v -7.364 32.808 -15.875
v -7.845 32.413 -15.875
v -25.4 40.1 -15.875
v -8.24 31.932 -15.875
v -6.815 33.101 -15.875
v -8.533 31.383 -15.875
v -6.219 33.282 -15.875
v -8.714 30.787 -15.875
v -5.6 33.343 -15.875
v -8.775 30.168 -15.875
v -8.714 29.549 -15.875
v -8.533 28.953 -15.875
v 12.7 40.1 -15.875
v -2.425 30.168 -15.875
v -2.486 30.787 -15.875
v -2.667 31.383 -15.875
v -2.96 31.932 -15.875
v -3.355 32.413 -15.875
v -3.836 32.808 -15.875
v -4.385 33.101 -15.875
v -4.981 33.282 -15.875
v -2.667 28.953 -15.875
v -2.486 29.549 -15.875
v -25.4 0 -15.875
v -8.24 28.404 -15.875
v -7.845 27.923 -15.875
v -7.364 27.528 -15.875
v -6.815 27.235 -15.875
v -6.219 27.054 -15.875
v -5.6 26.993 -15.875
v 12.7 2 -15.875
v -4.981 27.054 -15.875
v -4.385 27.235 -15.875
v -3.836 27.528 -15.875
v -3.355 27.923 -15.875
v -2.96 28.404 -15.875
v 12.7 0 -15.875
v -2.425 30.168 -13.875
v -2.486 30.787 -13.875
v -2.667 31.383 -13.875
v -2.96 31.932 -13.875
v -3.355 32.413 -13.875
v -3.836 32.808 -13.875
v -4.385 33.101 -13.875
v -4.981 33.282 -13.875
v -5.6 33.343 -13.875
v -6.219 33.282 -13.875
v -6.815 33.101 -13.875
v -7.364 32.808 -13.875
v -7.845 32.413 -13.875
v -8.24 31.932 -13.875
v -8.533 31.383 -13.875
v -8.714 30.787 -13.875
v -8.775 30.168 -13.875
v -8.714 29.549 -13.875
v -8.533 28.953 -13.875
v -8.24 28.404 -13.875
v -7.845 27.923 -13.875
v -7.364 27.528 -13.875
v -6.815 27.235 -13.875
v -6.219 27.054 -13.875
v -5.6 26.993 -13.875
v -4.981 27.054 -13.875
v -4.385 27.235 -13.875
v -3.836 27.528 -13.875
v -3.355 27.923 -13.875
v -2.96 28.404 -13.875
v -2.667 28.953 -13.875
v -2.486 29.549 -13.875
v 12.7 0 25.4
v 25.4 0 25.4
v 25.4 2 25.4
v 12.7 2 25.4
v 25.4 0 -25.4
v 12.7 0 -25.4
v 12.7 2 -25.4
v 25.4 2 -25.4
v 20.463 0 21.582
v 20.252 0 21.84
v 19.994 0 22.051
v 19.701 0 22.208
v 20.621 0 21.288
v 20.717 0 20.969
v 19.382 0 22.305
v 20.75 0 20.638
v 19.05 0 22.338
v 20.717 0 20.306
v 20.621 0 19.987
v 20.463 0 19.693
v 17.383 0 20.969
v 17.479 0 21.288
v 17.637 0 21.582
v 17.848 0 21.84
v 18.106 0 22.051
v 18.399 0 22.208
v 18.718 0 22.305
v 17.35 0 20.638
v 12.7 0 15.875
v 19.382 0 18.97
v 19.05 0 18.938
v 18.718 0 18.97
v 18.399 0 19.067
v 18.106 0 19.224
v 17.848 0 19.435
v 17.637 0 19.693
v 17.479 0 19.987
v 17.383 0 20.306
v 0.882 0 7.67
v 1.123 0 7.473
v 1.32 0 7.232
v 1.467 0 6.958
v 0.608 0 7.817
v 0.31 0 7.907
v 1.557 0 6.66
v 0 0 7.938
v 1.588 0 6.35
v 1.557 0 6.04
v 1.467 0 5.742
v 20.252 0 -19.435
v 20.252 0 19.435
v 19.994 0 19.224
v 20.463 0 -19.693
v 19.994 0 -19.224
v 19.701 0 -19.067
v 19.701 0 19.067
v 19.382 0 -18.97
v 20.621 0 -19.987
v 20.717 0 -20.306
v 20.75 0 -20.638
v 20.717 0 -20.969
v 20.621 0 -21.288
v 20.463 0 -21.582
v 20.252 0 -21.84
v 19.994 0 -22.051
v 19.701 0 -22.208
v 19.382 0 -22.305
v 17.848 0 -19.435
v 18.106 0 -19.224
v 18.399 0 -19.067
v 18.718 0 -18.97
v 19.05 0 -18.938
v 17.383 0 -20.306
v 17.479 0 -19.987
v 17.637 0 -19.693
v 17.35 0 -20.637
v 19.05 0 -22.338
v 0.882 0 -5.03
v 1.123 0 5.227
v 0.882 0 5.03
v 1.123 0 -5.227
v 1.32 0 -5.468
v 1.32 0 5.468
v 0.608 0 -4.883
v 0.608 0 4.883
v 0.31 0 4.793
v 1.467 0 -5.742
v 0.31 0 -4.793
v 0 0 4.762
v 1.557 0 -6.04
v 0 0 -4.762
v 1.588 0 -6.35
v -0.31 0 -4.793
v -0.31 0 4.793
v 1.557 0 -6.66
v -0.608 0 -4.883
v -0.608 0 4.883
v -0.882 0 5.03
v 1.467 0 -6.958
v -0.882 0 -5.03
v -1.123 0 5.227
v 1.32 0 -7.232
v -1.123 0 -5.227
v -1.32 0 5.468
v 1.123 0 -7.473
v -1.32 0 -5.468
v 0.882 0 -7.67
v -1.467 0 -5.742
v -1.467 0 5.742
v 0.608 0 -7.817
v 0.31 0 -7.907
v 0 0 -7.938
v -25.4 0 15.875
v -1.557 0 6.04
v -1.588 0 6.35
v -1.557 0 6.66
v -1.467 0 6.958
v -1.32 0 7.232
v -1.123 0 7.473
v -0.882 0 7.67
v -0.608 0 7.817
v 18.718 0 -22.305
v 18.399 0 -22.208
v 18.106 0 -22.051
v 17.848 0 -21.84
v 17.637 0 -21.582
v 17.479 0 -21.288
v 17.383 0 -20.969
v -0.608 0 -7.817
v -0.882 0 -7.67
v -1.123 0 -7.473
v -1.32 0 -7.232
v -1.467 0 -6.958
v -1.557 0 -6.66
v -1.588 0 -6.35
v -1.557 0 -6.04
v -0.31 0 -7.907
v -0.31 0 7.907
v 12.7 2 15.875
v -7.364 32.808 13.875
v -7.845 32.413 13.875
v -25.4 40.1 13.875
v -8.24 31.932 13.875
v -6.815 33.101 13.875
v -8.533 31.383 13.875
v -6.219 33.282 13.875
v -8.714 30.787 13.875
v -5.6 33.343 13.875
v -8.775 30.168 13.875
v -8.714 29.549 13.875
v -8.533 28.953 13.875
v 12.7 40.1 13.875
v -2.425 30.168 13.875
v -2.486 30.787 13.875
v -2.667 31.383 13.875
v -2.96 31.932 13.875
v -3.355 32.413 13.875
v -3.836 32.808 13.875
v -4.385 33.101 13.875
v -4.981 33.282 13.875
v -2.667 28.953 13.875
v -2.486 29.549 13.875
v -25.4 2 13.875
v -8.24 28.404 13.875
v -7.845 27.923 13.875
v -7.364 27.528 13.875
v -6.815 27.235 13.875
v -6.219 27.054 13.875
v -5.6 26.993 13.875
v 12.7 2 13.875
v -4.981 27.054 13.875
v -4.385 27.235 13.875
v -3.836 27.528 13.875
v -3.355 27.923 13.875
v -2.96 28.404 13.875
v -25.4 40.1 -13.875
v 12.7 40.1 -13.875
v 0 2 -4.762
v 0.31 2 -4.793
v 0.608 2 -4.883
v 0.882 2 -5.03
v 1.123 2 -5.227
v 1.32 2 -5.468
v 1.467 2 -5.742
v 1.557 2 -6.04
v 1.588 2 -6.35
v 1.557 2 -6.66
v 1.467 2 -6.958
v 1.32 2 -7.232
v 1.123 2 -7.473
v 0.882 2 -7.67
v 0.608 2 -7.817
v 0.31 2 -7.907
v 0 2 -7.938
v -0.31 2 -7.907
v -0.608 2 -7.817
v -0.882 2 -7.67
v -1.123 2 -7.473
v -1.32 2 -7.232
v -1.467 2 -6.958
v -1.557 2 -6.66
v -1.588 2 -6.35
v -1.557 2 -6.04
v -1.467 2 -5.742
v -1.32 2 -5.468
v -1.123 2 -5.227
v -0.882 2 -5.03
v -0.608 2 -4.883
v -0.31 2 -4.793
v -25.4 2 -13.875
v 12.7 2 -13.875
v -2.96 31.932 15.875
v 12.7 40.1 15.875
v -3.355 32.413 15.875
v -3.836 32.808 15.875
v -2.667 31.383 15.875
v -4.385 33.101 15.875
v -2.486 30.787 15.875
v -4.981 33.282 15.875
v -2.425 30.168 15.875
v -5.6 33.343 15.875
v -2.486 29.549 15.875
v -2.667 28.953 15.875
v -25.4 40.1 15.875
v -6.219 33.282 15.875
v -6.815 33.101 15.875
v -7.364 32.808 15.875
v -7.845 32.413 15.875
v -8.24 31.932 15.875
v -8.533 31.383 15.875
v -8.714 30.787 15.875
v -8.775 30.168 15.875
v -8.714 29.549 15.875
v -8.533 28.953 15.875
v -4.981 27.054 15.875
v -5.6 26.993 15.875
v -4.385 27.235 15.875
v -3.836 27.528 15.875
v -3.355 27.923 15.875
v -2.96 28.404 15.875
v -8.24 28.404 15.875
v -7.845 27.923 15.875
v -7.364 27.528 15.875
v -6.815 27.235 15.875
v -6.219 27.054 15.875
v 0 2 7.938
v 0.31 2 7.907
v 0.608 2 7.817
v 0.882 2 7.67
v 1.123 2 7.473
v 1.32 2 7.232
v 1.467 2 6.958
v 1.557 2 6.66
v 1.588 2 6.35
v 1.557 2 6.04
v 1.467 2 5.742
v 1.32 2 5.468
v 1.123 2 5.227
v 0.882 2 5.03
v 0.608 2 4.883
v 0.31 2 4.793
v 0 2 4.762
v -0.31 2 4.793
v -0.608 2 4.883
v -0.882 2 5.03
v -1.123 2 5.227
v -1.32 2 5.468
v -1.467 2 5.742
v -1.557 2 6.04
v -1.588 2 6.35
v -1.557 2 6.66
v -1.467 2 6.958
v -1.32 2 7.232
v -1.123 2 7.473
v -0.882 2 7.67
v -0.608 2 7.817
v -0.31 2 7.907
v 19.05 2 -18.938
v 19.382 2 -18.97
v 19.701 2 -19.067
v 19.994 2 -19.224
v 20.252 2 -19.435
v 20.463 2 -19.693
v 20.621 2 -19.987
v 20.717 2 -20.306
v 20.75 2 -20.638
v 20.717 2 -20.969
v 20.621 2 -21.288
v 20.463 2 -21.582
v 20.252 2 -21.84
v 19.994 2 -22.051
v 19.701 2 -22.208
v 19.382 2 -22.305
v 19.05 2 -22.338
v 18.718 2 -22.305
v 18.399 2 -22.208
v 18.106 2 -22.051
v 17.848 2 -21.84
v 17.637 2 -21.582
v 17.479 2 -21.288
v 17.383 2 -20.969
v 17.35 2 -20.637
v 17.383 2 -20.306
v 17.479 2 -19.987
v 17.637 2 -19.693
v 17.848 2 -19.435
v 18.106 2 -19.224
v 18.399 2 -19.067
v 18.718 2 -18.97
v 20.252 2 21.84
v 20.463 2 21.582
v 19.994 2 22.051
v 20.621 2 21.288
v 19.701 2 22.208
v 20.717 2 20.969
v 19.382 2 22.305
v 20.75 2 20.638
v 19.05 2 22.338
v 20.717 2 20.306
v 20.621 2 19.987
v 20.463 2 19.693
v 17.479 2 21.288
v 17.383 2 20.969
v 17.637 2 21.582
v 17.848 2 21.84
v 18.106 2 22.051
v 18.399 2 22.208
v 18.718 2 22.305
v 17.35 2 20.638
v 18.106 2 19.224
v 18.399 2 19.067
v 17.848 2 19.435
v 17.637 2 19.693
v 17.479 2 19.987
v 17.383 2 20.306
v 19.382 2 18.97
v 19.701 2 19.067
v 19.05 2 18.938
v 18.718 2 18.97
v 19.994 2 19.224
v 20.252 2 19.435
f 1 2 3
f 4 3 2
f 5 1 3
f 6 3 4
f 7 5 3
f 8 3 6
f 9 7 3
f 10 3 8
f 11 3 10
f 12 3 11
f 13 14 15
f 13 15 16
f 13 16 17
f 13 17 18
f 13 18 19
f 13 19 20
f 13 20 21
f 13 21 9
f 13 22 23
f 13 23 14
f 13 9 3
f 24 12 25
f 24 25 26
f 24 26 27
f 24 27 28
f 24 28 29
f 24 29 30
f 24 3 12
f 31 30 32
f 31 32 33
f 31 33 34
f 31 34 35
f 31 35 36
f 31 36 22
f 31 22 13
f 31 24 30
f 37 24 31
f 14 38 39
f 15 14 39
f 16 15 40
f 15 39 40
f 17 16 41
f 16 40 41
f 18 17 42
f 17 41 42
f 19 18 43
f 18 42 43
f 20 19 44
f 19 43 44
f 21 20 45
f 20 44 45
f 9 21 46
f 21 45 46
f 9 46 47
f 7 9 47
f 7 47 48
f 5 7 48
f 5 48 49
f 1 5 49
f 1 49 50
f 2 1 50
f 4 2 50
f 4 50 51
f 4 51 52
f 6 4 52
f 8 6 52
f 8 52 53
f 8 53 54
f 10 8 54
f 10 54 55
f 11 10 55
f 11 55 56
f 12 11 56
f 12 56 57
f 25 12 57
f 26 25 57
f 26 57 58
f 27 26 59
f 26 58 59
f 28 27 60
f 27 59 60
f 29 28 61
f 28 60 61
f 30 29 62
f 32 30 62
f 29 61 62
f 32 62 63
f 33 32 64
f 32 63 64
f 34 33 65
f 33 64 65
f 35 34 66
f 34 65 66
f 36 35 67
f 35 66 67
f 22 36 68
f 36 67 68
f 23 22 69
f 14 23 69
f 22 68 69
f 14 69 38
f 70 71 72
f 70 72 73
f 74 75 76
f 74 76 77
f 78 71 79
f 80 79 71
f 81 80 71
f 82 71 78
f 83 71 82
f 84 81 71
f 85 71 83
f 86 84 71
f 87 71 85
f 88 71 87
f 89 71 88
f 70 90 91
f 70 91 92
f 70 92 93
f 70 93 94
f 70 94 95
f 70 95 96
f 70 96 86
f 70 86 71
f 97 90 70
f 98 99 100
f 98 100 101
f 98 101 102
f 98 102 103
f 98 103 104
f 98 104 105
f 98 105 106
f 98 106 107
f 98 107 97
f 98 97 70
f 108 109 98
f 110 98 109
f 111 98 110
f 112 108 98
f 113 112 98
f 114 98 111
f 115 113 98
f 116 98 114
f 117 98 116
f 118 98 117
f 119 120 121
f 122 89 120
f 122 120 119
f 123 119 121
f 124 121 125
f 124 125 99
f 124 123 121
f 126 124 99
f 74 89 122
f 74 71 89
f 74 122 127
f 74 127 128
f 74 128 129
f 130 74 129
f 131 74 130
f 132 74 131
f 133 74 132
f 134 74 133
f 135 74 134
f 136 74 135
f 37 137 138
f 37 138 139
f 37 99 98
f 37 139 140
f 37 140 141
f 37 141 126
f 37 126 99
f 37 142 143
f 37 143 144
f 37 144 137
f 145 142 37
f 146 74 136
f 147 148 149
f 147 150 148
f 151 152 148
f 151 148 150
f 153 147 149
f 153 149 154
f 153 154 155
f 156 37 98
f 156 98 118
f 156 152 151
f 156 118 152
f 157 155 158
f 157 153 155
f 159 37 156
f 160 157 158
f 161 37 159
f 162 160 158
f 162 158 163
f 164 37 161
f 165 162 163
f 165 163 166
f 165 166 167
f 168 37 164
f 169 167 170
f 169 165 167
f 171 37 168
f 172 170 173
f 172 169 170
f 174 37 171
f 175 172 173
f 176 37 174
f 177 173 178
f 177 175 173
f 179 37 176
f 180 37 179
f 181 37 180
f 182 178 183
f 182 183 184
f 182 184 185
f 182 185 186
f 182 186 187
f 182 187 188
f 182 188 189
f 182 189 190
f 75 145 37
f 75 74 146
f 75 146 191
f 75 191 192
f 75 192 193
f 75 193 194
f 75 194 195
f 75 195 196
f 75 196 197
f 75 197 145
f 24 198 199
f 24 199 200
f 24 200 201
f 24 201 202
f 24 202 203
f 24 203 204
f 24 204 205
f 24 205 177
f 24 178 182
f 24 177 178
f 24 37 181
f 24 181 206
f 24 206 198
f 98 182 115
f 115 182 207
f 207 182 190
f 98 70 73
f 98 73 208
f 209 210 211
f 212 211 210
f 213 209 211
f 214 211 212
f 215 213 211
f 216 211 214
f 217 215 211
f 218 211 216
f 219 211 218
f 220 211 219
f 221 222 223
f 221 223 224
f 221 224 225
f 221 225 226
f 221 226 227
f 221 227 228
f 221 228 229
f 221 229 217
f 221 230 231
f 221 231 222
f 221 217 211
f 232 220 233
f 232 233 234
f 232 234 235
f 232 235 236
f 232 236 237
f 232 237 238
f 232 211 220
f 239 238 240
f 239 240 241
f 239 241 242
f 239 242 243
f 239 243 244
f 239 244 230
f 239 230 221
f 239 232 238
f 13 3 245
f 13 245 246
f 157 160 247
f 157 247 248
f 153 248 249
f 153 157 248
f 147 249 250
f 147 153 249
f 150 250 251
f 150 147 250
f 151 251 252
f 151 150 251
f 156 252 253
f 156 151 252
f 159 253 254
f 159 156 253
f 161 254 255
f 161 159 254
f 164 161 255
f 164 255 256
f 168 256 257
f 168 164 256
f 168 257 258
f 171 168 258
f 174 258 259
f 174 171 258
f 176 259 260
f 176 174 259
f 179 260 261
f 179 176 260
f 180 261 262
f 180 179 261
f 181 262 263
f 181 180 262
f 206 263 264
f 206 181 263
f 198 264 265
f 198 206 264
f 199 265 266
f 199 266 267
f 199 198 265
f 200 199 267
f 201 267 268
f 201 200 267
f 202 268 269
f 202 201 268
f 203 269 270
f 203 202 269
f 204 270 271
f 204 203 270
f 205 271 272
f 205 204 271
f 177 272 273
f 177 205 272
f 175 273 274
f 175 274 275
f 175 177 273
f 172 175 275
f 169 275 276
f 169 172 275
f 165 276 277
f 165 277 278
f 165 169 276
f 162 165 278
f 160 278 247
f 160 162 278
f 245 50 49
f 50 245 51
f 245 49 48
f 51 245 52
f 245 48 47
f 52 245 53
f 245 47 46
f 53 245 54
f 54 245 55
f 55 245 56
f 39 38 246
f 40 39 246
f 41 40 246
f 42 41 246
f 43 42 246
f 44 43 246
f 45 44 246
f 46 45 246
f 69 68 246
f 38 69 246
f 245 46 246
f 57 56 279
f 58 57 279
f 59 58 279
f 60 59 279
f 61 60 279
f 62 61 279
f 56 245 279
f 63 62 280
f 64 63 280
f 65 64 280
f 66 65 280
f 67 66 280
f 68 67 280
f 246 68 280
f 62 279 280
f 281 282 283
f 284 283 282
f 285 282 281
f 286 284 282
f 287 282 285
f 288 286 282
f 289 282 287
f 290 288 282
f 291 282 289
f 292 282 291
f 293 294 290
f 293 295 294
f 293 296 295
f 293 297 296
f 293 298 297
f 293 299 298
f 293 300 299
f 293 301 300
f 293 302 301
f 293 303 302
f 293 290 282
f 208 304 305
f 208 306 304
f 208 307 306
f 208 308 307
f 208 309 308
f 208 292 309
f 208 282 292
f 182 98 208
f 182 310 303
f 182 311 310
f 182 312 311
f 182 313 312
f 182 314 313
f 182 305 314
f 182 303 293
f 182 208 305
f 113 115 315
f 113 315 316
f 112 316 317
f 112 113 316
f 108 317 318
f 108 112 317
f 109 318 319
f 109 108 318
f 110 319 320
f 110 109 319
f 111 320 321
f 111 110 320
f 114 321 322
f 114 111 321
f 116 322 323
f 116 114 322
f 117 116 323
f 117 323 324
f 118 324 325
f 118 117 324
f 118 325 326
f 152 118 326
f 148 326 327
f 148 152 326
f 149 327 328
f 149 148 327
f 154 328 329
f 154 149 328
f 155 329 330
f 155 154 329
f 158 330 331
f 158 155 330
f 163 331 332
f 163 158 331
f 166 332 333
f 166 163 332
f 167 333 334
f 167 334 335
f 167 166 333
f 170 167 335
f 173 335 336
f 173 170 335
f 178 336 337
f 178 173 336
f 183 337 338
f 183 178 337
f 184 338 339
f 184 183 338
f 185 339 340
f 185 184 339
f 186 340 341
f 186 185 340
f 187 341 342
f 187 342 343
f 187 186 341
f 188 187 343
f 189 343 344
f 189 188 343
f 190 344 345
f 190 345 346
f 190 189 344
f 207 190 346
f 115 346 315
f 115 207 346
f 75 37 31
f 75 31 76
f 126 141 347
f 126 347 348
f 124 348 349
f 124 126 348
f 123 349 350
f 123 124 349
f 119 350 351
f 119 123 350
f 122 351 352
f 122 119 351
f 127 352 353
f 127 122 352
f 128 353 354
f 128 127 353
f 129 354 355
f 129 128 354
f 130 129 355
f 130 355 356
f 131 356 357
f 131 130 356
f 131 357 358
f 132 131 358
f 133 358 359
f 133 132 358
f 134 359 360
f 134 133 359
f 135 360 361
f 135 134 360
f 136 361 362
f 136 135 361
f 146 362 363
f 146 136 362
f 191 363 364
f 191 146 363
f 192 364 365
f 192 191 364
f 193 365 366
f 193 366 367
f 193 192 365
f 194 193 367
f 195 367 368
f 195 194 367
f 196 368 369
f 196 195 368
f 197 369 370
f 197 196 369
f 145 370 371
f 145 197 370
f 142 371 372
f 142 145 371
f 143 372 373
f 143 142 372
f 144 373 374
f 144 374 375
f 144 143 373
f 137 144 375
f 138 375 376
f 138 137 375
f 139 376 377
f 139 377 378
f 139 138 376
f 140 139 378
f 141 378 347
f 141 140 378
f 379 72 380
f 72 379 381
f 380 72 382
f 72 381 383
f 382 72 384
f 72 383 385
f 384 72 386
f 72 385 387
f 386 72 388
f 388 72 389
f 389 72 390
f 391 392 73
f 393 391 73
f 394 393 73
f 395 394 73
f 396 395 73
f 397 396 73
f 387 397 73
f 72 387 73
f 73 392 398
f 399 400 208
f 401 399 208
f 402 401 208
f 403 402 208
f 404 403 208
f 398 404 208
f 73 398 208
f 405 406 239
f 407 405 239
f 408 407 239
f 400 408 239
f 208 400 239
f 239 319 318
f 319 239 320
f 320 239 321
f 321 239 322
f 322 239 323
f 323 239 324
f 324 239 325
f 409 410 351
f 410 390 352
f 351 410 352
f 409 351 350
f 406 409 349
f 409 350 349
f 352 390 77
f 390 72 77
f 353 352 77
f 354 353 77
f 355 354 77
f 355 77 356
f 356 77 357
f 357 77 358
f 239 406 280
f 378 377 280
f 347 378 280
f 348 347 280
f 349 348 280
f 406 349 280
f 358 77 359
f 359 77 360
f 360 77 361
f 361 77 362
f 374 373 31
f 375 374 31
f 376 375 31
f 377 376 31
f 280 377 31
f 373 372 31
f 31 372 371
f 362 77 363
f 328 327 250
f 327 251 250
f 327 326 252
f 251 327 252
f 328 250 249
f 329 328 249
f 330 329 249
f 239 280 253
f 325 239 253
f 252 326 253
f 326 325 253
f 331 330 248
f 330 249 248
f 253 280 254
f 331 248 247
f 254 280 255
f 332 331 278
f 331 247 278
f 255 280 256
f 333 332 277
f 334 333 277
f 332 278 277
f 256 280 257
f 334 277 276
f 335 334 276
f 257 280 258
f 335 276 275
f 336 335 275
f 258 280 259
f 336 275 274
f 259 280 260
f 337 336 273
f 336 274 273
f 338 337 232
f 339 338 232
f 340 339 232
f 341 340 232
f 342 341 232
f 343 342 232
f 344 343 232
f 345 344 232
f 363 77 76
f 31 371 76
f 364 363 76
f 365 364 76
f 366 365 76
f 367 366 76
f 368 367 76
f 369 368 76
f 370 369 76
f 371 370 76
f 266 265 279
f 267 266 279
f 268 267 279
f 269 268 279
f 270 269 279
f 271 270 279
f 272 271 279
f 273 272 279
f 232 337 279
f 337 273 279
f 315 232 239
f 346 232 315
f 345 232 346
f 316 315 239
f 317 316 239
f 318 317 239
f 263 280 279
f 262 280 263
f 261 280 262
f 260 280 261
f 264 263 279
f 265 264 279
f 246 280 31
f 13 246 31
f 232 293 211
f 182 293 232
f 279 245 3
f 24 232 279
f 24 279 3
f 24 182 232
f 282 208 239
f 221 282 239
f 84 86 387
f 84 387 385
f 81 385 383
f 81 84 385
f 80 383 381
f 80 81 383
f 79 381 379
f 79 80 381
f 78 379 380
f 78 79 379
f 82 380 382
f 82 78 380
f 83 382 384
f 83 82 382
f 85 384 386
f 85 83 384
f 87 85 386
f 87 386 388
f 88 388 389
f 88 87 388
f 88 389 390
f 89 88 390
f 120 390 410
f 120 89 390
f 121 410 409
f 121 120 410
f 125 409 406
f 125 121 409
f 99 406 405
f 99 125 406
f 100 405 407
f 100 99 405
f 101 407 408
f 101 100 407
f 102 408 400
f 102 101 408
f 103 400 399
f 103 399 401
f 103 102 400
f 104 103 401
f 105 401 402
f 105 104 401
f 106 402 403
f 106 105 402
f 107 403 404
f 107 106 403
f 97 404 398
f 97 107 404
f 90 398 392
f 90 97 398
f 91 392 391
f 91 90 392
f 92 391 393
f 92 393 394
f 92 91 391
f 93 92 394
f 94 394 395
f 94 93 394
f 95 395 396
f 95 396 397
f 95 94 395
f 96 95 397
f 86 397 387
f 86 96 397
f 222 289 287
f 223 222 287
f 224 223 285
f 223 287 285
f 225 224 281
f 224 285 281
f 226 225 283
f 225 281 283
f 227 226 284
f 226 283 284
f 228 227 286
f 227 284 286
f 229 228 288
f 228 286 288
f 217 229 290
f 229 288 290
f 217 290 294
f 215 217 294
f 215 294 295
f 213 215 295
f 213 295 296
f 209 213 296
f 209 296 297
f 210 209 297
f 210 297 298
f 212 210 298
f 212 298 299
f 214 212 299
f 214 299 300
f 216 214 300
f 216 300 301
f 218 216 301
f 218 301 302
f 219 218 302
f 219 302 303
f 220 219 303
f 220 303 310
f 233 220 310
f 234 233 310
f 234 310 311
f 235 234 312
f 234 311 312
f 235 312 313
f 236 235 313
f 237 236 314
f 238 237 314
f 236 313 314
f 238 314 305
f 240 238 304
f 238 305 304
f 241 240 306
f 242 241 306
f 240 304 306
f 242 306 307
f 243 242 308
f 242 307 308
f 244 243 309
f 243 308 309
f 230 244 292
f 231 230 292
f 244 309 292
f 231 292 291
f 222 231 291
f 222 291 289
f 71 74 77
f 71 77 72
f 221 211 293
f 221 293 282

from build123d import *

# Parameters (mm, degrees)
SKETCH1_R           = 1.7
SKETCH1_R_2         = 1.5875
BOSS_EXTRUDE1_DEPTH = 2
SKETCH2_W           = 38.1
SKETCH2_H           = 2
BOSS_EXTRUDE2_DEPTH = 38.1
SKETCH3_R           = 3.175
CUT_EXTRUDE1_DEPTH  = 63.903065307


with BuildPart() as part:
    # Sketch1 → Boss-Extrude1 (new body)
    with BuildSketch(Plane(origin=(0, 0, 0), x_dir=(1, 0, 0), z_dir=(0, 1, 0))):
        Polygon((-25.4, 15.875), (12.7, 15.875), (12.7, 25.4), (25.4, 25.4), (25.4, -25.4), (12.7, -25.4), (12.7, -15.875), (-25.4, -15.875), align=None)
        with Locations(Location((19.05, 20.6375, 0), (0, 0, 270))):
            Circle(SKETCH1_R, mode=Mode.SUBTRACT)
        with Locations(Location((19.05, -20.6375, 0), (0, 0, 270))):
            Circle(SKETCH1_R, mode=Mode.SUBTRACT)
        with Locations(Location((0, 6.35, 0), (0, 0, 270))):
            Circle(SKETCH1_R_2, mode=Mode.SUBTRACT)
        with Locations(Location((0, -6.35, 0), (0, 0, 270))):
            Circle(SKETCH1_R_2, mode=Mode.SUBTRACT)
    extrude(amount=BOSS_EXTRUDE1_DEPTH)

    # Sketch2 → Boss-Extrude2 (add)
    with BuildSketch(Plane(origin=(0, 2, 0), x_dir=(1, 0, 0), z_dir=(0, 1, 0))):
        with Locations((-6.35, 14.875)):
            Rectangle(SKETCH2_W, SKETCH2_H)
        with Locations((-6.35, -14.875)):
            Rectangle(SKETCH2_W, SKETCH2_H)
    extrude(amount=BOSS_EXTRUDE2_DEPTH)

    # Sketch3 → Cut-Extrude1 (cut, through all)
    with BuildSketch(Plane.XY.offset(15.875)):
        with Locations((-5.6, 30.16795818)):
            Circle(SKETCH3_R)
    extrude(amount=-CUT_EXTRUDE1_DEPTH, mode=Mode.SUBTRACT)


solid = part.part
